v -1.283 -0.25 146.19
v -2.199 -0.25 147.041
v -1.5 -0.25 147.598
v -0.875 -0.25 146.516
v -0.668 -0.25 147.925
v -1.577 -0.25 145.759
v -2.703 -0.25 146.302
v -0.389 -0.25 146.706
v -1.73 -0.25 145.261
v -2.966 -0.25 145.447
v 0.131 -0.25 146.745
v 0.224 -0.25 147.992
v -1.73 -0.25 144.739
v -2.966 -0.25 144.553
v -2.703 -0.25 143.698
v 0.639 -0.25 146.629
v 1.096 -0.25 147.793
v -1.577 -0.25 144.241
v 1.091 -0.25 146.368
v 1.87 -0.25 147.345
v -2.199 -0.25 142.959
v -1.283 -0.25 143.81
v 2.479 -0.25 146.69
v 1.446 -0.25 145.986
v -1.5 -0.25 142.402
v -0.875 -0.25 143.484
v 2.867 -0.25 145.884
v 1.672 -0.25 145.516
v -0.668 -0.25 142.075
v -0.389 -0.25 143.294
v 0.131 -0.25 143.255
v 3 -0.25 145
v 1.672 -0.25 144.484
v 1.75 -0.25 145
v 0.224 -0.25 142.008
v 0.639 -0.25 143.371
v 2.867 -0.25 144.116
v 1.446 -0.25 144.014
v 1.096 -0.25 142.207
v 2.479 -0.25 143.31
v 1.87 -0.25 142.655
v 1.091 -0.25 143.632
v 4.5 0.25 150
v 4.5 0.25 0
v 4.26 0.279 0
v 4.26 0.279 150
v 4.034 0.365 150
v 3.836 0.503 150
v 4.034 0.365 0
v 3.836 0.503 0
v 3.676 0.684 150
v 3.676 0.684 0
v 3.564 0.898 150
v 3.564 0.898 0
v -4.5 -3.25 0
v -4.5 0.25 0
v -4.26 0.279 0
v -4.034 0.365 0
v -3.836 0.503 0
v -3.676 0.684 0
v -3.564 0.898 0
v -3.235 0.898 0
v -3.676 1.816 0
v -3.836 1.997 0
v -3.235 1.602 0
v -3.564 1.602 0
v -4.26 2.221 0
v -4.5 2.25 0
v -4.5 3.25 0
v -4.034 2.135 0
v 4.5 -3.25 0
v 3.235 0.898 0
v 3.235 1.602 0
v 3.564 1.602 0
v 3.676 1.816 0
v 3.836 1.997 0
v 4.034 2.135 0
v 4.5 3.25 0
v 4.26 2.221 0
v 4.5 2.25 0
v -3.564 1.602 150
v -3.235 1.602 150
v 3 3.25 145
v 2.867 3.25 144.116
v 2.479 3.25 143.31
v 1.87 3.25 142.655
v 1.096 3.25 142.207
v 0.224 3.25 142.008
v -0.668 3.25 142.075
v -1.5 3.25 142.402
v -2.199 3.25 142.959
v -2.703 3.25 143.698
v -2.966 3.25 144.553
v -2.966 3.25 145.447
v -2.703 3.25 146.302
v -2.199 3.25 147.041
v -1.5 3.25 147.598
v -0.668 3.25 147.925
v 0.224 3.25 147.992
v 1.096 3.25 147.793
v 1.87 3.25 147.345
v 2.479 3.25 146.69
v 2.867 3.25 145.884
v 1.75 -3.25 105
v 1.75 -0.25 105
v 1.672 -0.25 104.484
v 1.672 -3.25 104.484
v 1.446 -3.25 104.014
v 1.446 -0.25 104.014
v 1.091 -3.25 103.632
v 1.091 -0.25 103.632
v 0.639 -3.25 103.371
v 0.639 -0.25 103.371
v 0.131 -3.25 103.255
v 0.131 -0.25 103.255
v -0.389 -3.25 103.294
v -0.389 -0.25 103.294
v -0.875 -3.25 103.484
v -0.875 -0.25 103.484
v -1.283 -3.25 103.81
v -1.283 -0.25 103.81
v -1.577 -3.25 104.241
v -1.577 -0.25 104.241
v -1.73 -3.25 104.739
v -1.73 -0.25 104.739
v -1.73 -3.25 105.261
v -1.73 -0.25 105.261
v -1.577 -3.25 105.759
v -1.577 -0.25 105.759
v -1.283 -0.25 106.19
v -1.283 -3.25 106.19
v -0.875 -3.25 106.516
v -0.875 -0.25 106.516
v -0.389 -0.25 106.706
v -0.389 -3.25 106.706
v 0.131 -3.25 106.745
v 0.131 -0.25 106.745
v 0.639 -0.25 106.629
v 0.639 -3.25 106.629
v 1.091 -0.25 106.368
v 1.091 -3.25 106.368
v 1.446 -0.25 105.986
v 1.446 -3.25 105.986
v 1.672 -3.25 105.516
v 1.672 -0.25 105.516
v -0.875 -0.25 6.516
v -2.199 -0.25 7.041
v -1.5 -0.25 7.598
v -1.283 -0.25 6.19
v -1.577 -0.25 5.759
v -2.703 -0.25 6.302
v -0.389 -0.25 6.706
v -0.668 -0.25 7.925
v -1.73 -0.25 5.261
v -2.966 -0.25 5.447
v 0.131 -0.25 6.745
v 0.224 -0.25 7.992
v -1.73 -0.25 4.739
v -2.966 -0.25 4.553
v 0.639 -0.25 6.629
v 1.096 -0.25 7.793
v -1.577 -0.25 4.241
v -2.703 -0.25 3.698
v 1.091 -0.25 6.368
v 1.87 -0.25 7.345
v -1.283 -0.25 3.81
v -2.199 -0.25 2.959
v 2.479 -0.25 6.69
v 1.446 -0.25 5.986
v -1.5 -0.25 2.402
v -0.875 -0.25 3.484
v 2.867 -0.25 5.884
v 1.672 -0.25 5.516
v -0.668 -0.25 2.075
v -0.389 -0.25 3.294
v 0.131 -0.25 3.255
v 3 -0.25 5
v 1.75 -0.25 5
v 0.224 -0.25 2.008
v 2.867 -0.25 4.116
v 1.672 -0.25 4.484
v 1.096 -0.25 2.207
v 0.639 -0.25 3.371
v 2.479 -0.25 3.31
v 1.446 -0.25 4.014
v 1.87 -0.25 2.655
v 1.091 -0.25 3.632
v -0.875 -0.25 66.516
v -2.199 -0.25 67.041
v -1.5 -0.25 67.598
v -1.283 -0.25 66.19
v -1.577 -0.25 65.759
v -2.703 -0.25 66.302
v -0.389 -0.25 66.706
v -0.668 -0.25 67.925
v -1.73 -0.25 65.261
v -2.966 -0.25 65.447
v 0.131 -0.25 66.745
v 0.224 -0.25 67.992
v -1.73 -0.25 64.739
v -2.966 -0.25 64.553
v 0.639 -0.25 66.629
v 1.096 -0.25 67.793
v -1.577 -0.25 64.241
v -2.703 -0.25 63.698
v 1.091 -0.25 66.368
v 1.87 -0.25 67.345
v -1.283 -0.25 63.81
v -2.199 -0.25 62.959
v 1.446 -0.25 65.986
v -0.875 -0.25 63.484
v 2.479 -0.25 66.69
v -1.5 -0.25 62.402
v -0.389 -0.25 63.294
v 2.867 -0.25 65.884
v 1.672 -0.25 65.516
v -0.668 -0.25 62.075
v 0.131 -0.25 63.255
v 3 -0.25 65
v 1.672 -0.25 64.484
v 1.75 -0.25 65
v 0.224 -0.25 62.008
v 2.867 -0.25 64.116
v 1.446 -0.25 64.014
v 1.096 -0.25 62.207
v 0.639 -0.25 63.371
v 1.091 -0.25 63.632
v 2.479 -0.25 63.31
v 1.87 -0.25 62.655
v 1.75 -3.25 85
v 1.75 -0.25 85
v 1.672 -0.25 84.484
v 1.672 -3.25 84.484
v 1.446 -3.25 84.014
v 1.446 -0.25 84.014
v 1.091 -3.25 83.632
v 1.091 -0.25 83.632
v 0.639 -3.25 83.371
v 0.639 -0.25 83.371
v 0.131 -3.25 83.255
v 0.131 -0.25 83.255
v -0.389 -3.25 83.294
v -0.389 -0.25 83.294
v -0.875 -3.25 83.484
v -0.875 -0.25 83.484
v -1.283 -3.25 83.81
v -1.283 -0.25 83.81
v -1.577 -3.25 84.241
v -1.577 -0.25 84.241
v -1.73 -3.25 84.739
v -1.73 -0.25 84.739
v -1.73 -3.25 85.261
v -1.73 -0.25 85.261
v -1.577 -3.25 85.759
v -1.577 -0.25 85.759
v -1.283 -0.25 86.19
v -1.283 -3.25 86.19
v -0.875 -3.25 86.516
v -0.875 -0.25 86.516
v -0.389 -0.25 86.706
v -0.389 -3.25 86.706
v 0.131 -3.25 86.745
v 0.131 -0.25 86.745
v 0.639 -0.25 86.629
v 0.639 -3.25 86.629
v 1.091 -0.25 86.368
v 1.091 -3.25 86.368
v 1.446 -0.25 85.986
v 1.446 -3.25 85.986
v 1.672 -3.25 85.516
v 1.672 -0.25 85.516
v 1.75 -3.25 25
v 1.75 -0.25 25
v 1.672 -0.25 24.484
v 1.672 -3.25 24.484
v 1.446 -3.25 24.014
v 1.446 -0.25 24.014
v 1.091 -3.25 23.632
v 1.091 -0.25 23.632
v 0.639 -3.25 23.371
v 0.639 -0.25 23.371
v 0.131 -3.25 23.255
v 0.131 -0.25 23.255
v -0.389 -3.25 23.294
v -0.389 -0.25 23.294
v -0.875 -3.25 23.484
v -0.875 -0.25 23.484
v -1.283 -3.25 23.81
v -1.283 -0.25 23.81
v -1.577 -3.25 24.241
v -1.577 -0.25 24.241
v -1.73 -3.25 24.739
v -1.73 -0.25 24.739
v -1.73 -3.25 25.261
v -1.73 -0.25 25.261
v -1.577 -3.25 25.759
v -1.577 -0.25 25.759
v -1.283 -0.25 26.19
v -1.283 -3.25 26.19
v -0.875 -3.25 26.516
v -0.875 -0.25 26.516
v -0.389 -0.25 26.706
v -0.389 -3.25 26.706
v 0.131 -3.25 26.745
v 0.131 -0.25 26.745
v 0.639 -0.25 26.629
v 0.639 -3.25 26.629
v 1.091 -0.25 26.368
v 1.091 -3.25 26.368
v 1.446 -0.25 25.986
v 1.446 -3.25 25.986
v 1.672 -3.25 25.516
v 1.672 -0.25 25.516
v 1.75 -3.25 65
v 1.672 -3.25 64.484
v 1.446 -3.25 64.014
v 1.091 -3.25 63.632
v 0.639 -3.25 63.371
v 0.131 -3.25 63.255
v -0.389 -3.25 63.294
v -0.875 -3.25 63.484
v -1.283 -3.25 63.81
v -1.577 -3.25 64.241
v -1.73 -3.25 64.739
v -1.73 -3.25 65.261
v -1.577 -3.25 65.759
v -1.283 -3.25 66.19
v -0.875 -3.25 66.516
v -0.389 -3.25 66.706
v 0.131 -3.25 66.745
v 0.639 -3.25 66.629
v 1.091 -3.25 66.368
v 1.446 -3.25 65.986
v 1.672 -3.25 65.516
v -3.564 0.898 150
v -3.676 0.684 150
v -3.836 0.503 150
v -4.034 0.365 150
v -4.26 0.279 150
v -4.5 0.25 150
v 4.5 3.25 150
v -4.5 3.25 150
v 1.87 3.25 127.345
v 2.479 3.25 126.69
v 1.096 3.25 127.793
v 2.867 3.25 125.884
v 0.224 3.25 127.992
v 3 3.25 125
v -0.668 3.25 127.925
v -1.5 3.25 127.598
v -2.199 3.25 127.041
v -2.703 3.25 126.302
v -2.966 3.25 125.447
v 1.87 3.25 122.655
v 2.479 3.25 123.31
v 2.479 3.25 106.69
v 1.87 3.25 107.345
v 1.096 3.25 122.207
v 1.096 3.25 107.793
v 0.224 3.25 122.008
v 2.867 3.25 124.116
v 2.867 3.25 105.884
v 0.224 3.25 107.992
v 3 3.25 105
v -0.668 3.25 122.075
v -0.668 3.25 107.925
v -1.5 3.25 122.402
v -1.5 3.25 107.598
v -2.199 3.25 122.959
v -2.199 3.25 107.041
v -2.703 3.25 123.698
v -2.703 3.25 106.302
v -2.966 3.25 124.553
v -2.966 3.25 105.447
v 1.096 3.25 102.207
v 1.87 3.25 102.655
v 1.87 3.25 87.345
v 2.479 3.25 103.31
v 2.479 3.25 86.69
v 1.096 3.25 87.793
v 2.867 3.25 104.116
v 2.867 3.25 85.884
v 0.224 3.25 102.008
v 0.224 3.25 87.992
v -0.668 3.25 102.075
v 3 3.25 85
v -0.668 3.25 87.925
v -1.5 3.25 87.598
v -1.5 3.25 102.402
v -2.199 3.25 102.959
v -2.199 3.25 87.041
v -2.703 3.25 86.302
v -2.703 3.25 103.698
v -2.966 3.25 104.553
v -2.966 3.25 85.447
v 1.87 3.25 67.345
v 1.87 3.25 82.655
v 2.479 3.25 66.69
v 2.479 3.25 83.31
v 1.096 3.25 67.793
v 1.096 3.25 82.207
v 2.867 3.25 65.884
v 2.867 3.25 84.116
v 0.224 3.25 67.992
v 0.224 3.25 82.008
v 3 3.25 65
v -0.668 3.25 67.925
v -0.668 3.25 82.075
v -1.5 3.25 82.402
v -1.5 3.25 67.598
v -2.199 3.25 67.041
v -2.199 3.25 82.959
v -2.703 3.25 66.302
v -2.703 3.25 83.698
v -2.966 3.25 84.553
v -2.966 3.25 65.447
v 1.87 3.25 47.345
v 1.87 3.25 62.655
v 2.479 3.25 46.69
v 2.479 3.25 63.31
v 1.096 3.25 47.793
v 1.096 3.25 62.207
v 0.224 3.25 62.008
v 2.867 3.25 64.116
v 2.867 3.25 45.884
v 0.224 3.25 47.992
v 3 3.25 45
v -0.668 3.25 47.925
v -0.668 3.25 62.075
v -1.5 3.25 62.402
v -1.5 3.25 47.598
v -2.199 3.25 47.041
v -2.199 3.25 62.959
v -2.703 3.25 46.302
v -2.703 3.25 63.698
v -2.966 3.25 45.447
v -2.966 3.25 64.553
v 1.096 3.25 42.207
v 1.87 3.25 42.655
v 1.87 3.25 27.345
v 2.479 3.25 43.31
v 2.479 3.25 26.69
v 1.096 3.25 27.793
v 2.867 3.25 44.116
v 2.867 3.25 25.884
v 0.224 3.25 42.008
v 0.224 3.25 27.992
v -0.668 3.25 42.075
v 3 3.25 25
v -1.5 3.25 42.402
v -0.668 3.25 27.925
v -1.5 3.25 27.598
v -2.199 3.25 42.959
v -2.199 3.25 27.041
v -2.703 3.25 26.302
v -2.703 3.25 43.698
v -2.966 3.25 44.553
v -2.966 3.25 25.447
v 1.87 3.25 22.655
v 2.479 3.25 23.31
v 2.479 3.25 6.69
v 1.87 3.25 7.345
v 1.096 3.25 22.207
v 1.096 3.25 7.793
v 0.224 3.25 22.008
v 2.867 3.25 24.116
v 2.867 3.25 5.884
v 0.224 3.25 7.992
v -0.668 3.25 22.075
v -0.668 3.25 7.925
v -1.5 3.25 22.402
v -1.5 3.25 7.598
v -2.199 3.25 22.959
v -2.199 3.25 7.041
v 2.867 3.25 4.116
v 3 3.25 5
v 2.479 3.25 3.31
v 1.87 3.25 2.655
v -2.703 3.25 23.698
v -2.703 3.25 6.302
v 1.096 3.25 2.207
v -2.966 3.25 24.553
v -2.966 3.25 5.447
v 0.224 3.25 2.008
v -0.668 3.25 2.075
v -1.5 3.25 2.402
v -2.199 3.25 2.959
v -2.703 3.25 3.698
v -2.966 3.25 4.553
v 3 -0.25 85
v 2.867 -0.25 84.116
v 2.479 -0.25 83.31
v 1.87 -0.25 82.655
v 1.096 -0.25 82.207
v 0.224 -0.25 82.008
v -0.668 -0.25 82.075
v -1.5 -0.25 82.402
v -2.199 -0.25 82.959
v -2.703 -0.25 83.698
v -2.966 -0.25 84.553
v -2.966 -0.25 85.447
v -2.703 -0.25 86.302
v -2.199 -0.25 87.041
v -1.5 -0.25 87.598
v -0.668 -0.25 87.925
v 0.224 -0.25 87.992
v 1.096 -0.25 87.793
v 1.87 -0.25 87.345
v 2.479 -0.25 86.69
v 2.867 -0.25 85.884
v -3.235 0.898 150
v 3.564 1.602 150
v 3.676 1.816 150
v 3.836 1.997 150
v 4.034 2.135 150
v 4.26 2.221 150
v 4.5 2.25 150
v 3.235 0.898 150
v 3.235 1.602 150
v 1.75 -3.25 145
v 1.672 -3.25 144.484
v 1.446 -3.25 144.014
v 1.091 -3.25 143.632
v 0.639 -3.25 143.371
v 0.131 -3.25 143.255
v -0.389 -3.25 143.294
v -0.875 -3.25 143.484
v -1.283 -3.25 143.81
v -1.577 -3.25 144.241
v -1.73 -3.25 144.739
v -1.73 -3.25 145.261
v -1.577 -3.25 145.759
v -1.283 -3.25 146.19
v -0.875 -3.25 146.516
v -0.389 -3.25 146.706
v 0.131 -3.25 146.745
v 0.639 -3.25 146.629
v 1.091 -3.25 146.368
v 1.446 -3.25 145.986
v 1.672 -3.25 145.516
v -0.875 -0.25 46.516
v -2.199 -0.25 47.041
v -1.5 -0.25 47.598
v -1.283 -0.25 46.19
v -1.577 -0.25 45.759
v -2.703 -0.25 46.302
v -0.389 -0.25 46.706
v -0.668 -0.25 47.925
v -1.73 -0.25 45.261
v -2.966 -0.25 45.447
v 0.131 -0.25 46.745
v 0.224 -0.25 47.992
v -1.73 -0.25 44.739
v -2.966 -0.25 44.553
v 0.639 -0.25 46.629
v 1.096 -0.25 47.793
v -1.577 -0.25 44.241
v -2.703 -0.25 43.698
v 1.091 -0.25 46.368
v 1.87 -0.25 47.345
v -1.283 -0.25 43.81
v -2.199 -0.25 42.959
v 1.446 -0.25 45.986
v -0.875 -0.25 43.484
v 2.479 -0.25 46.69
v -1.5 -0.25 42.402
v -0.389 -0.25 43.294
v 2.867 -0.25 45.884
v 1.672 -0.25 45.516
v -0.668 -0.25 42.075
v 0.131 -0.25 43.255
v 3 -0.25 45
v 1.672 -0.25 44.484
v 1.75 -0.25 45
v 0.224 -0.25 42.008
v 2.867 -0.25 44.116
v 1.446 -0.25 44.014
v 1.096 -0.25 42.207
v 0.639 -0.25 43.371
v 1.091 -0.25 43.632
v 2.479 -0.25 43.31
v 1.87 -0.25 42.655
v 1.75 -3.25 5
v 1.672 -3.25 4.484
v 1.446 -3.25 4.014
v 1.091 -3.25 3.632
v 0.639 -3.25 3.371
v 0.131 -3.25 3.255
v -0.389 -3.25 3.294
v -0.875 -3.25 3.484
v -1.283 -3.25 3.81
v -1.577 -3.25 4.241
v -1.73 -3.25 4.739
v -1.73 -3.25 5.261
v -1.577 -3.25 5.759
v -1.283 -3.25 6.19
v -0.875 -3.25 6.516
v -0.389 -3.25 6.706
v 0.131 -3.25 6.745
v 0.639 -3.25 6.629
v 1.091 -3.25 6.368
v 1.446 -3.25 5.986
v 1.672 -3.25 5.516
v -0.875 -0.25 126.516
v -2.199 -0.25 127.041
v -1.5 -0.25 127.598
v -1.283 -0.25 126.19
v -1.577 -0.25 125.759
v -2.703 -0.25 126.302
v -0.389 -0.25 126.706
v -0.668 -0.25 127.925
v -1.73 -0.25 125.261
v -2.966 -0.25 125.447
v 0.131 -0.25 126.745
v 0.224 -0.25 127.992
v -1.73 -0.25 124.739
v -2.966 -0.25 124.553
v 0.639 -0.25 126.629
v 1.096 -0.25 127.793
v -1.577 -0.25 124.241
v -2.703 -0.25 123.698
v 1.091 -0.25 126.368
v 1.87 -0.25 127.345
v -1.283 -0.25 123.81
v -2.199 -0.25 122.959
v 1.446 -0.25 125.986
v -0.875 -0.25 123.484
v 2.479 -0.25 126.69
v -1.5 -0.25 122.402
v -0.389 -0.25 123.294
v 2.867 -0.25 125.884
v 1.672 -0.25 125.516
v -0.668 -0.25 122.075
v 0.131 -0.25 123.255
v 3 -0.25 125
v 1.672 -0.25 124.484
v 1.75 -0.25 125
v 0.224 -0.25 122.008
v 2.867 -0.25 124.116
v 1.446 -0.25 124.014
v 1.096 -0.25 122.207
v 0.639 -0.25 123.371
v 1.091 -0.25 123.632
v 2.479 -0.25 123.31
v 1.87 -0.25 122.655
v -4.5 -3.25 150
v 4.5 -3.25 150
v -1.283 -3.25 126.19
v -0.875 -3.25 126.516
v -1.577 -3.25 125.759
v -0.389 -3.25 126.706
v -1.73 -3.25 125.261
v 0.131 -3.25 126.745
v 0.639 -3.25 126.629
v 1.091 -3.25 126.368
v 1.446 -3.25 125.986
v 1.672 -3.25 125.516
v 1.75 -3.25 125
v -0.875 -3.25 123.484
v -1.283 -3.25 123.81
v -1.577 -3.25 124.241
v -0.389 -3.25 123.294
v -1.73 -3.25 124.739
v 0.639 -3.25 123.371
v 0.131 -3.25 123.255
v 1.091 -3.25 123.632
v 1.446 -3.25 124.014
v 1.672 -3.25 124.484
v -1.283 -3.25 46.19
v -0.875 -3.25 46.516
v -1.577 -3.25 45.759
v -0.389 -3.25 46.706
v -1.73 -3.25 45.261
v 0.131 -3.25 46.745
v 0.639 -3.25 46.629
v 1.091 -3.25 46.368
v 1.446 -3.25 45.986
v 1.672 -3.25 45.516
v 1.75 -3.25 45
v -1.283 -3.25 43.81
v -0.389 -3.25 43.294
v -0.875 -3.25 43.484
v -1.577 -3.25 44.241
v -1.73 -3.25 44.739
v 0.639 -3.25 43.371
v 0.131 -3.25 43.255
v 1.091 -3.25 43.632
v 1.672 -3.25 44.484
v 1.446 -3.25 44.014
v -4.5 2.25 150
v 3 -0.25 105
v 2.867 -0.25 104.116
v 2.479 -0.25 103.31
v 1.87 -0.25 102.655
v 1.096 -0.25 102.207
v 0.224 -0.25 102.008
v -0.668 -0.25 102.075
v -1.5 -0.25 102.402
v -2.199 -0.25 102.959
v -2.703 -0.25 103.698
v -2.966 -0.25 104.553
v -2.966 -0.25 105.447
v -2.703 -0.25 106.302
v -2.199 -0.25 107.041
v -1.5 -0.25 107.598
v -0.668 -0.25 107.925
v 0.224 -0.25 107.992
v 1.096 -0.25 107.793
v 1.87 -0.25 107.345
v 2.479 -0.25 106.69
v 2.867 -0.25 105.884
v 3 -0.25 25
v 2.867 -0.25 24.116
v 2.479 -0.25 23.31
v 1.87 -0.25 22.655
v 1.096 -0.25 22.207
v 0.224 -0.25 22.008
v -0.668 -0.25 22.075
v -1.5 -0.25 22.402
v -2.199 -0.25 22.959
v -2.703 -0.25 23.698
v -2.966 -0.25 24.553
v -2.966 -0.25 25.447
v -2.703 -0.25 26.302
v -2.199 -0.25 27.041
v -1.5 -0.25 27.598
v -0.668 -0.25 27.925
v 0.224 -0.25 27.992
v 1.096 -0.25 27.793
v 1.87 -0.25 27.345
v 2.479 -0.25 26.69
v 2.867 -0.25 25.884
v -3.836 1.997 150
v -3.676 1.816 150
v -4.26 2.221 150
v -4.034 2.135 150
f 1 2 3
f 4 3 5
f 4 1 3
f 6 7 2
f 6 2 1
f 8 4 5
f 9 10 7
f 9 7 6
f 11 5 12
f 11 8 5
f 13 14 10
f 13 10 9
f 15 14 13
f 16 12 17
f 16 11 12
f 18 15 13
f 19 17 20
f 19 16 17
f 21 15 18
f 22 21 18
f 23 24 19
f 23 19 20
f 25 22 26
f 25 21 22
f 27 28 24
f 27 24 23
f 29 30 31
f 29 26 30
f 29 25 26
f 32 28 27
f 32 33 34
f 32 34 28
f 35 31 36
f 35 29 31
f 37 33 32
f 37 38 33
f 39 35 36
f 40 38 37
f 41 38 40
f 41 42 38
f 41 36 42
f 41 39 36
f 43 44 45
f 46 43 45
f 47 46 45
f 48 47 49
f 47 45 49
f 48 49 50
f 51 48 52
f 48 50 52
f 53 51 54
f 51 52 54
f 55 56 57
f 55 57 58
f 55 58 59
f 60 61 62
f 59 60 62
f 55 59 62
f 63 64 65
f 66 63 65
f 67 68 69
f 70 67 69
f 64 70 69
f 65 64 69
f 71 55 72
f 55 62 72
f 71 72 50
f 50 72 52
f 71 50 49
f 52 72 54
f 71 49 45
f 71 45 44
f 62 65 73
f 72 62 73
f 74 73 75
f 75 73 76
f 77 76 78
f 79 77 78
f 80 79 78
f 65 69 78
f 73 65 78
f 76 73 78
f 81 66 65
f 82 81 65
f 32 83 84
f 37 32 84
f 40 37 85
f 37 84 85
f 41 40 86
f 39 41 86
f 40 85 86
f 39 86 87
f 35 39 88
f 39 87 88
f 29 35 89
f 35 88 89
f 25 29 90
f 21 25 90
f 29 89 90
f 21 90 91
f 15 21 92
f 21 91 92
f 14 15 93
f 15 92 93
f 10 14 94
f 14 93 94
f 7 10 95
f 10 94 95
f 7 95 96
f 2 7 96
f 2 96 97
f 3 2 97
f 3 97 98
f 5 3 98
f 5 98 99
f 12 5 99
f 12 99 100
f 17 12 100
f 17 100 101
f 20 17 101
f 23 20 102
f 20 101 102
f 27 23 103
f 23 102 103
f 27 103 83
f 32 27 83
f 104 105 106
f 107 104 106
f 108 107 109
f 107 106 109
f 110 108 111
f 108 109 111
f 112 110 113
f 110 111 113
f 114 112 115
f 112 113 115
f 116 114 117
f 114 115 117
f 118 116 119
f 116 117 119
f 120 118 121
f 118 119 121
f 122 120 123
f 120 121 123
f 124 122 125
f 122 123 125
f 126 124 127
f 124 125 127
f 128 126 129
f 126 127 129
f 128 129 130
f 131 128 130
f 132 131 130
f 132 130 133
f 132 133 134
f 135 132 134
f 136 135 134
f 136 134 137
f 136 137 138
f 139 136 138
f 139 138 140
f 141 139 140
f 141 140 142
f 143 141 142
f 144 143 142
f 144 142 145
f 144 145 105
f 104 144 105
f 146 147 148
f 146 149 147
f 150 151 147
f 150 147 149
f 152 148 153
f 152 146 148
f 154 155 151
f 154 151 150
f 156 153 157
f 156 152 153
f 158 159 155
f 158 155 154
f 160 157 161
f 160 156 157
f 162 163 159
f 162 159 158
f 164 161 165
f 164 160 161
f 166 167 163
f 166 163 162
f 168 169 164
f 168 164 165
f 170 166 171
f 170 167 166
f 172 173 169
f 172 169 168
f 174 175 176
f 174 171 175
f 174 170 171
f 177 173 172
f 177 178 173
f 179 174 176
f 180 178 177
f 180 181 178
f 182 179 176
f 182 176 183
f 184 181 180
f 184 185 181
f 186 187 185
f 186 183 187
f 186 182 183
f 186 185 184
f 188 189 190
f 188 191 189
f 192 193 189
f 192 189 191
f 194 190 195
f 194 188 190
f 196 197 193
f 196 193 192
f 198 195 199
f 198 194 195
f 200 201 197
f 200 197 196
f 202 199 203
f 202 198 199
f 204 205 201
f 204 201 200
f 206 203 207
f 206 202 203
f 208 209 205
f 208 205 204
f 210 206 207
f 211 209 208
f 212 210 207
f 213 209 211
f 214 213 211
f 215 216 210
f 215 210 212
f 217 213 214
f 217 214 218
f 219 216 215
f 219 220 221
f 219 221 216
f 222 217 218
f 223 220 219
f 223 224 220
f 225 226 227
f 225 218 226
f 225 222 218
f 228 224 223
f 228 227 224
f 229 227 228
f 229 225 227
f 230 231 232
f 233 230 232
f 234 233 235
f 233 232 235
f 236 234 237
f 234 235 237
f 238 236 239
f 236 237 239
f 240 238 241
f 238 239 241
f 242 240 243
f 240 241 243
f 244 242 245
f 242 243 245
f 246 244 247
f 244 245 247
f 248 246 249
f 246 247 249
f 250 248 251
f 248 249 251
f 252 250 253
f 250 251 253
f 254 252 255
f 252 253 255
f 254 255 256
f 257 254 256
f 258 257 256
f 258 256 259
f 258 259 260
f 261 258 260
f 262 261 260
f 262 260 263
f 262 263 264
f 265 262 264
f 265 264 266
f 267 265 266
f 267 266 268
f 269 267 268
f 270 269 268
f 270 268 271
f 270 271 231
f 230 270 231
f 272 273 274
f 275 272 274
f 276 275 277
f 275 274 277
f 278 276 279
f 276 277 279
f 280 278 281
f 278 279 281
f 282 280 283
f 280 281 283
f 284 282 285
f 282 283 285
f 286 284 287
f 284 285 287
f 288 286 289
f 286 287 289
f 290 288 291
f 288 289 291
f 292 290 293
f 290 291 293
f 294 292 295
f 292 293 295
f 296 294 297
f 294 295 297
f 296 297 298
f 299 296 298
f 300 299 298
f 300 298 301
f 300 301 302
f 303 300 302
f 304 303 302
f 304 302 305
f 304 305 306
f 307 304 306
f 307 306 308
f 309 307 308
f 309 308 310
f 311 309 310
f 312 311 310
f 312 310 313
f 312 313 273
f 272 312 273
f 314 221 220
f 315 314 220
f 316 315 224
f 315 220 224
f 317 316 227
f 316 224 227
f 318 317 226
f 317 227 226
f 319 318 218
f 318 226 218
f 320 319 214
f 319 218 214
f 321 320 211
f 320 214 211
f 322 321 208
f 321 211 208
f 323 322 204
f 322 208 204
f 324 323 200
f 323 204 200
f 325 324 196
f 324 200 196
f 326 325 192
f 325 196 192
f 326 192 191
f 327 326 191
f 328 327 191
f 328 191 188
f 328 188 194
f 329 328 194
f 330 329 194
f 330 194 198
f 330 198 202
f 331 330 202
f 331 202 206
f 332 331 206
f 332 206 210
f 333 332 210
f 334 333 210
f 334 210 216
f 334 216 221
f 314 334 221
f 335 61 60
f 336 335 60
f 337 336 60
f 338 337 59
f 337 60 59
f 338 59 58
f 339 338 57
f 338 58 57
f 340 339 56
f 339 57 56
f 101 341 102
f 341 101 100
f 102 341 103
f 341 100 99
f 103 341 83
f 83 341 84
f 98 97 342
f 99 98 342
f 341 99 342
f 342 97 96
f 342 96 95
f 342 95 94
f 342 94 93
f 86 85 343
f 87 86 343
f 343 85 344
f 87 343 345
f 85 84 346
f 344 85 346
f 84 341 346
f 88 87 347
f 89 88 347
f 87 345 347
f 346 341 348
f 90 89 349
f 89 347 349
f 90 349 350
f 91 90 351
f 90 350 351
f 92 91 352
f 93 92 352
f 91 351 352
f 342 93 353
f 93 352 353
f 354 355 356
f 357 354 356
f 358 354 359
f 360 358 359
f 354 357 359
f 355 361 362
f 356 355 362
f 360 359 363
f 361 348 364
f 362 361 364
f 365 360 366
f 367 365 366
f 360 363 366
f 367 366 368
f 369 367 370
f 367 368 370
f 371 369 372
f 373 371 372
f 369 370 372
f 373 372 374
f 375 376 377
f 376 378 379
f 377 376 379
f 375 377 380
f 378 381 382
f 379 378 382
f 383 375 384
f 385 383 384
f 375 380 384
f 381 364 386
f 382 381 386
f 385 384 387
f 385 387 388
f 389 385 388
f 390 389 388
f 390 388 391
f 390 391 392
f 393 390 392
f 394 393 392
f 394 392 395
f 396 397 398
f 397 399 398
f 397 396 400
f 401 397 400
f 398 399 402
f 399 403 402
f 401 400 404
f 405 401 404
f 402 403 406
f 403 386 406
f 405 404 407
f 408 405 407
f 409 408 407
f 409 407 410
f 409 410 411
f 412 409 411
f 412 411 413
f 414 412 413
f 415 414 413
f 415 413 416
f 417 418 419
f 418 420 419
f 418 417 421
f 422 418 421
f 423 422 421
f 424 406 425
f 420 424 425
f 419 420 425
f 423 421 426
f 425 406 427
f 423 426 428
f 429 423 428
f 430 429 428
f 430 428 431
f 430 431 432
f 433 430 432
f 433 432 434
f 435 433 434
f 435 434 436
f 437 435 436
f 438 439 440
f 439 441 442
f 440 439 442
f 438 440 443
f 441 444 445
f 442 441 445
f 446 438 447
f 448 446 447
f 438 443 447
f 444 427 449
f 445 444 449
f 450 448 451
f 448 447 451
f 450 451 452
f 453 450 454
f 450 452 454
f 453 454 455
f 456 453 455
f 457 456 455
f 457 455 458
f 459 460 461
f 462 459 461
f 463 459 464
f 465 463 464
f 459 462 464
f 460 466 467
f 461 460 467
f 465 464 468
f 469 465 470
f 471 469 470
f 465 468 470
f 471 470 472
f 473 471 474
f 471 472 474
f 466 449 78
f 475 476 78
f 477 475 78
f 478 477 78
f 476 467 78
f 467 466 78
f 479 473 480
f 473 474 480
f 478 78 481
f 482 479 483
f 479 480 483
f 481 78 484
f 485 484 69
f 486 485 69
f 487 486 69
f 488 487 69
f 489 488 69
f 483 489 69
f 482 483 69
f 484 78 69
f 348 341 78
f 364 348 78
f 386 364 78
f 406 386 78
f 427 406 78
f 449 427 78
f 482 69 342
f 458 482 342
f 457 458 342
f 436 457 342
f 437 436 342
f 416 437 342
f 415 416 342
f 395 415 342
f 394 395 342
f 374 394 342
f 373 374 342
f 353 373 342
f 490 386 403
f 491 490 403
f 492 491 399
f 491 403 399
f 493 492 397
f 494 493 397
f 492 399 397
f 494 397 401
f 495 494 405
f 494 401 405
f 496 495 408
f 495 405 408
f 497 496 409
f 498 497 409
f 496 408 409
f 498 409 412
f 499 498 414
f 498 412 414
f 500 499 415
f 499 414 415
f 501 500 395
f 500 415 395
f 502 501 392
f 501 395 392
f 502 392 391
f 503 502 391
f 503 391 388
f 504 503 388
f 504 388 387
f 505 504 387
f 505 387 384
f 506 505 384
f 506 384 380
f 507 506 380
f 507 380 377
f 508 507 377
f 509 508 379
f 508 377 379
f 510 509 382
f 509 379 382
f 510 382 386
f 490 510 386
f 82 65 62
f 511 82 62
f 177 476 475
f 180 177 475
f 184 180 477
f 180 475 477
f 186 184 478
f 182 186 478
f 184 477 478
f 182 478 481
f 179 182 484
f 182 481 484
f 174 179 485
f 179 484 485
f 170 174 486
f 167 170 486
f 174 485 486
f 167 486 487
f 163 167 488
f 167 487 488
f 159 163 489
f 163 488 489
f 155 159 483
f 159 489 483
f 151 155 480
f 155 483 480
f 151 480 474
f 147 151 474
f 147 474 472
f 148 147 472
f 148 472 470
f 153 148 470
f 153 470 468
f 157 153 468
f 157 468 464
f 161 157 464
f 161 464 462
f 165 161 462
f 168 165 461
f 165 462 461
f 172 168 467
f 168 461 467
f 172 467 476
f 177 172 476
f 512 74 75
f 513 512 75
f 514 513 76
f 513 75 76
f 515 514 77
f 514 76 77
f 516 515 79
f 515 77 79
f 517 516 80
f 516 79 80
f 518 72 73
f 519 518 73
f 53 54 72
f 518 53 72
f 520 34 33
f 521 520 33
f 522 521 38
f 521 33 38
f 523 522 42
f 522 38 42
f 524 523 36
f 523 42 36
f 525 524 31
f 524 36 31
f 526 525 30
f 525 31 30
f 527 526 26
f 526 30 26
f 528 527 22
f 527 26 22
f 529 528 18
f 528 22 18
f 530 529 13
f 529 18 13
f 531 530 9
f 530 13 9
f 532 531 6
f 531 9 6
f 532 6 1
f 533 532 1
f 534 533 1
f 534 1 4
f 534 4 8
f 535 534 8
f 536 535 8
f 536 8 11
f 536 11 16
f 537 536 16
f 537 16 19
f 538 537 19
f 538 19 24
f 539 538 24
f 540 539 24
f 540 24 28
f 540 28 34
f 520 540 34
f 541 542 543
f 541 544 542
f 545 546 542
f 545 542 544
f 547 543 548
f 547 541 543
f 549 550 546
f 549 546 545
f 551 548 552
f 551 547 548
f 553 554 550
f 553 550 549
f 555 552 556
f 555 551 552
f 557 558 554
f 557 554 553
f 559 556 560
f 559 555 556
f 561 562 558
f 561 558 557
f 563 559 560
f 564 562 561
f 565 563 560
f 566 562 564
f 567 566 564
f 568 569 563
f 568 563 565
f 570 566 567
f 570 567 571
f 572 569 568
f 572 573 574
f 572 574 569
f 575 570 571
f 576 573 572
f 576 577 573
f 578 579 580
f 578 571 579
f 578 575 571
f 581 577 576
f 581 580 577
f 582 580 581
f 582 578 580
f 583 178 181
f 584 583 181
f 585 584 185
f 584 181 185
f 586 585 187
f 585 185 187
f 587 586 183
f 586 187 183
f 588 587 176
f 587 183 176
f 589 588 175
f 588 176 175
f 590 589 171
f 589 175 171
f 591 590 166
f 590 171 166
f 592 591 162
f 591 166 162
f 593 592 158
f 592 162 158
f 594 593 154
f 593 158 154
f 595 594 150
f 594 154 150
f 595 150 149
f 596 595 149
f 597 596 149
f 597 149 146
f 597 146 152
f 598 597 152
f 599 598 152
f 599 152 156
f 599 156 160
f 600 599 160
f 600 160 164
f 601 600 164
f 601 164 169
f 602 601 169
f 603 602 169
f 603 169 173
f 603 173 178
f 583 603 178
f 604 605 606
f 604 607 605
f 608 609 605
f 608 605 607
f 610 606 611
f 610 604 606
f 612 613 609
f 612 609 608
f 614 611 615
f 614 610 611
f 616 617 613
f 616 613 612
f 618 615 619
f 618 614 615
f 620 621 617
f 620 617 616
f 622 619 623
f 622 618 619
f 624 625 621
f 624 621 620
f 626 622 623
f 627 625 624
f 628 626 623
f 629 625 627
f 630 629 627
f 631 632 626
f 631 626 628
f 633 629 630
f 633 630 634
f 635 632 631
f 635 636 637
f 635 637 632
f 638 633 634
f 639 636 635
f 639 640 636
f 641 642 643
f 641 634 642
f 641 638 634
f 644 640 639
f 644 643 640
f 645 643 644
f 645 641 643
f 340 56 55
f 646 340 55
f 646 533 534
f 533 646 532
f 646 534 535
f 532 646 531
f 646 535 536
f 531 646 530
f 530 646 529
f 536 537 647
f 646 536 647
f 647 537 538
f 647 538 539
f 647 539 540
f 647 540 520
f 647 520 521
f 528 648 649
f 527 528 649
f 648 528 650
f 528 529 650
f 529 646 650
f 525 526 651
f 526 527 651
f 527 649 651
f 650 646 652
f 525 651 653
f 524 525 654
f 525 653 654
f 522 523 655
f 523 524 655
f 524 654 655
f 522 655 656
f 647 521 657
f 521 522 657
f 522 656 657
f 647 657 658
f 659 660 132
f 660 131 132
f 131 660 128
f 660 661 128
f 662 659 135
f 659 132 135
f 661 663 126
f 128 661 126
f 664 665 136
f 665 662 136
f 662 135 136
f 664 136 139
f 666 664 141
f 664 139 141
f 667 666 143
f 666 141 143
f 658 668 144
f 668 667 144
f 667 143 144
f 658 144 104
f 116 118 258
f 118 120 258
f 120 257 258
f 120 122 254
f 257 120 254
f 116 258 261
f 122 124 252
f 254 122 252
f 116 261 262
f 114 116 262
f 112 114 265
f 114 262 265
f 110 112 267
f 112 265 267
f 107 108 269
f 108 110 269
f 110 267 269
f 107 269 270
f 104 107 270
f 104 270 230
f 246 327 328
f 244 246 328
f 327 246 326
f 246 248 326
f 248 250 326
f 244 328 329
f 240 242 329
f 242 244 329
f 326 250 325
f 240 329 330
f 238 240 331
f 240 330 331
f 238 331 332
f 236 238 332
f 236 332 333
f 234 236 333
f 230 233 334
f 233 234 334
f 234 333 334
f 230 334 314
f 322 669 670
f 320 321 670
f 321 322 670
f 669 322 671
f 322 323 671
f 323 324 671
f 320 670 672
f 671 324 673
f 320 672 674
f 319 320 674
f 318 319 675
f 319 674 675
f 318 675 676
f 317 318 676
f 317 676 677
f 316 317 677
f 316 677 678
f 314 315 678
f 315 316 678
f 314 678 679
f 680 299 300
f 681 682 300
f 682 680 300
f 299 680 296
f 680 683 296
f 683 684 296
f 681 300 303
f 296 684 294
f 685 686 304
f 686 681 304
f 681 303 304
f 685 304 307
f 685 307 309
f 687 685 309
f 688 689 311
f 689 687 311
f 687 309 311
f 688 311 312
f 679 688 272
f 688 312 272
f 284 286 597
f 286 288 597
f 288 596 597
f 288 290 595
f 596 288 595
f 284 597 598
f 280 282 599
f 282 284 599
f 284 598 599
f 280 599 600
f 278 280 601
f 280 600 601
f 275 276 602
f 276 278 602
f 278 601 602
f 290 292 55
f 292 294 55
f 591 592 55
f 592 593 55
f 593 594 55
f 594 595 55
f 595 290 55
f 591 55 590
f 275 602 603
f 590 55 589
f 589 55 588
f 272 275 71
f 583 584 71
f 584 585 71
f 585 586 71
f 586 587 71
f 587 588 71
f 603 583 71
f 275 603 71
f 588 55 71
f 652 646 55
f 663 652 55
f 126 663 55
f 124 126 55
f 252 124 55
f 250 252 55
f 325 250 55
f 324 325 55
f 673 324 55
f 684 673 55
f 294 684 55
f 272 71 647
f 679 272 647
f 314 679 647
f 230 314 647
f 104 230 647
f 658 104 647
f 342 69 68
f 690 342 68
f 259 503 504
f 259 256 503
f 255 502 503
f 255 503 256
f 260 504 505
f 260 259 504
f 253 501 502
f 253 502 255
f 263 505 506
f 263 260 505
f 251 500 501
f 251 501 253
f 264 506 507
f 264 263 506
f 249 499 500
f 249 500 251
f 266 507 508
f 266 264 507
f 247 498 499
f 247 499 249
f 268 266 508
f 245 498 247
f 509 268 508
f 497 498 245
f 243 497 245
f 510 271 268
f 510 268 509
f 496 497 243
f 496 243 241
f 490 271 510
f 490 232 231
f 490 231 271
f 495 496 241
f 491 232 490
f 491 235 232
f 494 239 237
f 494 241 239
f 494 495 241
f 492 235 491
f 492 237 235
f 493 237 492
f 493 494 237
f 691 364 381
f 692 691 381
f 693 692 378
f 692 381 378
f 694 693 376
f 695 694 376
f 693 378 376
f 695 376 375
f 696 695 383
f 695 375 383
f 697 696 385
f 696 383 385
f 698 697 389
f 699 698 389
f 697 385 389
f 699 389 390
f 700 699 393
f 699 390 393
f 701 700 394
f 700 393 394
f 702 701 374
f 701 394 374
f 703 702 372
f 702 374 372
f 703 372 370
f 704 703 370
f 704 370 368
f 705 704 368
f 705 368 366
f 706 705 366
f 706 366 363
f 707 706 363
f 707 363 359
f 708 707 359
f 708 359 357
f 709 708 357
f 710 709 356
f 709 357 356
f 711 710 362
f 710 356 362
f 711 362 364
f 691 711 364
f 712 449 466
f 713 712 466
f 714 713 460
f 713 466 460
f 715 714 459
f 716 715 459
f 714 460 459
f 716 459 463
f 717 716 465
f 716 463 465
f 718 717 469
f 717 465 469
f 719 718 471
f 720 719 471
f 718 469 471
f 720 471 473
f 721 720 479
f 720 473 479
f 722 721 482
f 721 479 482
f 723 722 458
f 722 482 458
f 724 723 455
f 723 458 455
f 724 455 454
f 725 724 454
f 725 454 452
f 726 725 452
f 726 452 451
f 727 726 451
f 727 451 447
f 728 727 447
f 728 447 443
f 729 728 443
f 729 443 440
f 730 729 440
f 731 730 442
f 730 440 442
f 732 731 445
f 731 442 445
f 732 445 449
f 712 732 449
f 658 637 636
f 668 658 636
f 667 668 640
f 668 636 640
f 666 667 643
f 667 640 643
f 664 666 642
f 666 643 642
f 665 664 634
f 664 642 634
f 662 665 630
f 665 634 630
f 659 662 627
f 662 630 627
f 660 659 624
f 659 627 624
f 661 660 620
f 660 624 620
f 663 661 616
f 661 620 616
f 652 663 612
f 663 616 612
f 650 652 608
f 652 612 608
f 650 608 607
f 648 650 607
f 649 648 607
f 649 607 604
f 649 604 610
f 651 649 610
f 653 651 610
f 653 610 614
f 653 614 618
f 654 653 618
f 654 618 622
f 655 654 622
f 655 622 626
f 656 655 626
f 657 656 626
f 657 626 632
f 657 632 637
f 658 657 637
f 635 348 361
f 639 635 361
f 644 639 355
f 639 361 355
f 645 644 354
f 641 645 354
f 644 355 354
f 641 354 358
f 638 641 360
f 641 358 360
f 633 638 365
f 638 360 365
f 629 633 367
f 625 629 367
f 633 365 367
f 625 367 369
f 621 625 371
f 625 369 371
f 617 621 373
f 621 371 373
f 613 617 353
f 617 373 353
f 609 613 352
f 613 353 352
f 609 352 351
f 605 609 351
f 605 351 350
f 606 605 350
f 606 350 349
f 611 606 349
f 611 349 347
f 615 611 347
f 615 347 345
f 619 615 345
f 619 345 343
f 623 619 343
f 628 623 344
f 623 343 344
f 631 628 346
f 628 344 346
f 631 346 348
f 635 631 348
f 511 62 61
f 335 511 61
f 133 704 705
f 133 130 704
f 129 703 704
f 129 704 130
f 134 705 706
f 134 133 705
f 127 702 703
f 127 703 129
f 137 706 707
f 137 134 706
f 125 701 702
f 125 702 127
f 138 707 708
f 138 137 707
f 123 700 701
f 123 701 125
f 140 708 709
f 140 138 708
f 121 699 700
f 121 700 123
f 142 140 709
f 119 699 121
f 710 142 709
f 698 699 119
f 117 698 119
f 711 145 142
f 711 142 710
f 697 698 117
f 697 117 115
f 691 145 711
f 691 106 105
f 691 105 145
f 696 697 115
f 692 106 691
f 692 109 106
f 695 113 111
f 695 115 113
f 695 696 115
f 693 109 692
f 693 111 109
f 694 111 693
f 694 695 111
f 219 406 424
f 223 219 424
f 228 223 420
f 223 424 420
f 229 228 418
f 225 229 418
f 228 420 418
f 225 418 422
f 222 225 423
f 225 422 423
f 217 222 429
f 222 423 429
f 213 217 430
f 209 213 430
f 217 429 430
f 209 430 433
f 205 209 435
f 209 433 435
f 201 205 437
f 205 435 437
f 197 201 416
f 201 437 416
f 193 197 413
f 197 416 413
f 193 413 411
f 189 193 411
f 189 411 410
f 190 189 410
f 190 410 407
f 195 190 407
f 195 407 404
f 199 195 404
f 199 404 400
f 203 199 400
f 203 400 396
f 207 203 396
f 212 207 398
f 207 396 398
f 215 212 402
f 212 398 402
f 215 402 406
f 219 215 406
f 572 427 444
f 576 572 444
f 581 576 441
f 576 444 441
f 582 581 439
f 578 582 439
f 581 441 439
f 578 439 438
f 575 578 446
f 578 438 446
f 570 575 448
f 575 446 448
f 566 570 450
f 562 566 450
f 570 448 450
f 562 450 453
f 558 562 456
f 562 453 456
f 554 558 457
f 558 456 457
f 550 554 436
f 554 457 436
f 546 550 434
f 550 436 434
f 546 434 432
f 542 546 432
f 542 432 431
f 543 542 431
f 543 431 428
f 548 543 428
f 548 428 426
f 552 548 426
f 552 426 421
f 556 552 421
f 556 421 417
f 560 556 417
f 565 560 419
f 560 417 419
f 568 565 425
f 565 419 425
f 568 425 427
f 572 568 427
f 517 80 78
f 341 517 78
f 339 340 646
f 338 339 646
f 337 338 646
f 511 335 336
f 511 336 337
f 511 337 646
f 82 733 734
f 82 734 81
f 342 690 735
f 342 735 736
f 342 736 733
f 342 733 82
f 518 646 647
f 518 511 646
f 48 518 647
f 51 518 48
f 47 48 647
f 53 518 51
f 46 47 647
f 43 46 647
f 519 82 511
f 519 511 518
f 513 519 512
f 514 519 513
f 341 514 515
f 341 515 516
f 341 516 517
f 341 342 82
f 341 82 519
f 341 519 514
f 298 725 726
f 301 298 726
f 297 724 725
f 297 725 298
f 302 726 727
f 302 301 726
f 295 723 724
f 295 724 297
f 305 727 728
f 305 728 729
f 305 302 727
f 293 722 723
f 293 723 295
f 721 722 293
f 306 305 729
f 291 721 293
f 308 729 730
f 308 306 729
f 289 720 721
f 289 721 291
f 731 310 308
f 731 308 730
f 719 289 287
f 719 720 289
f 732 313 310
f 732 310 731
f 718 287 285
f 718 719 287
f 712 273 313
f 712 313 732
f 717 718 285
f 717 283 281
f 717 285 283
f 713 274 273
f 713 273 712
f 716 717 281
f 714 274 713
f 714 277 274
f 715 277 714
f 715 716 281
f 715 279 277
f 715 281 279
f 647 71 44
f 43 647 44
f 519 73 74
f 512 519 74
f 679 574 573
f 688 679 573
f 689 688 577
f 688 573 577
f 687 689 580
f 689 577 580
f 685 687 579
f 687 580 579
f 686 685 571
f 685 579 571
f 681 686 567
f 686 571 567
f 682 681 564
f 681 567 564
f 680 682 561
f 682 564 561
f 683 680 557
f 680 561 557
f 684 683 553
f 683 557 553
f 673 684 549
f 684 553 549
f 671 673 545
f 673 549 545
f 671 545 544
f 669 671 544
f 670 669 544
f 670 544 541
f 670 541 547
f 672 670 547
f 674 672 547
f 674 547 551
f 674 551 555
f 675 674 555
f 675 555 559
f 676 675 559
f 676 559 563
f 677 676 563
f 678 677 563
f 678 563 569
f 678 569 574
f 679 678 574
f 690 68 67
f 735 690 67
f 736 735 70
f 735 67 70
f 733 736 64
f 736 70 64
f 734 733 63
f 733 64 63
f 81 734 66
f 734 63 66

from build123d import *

# Parameters (mm, degrees)
EXTRUDE1_DEPTH  = 150
SKETCH2_R       = 3
EXTRUDE2_DEPTH  = 3.5
SKETCH_R        = 1.75
EXTRUDE3_DEPTH  = 7.5
LPATTERN1_COUNT = 13
LPATTERN1_PITCH = 20


with BuildPart() as part:
    # Sketch1 → Extrude1 (new body)
    with BuildSketch(Plane.XY):
        with BuildLine():
            Line((-4.5, -3.25), (4.5, -3.25))
            Line((4.5, -3.25), (4.5, 0.25))
            ThreePointArc((4.5, 0.25), (3.93077967, 0.427814974), (3.563991137, 0.898023568))
            Line((3.563991137, 0.898023568), (3.235073025, 0.898023568))
            Line((3.235073025, 0.898023568), (3.235073025, 1.601976432))
            Line((3.235073025, 1.601976432), (3.563991137, 1.601976432))
            ThreePointArc((3.563991137, 1.601976432), (3.93077967, 2.072185026), (4.5, 2.25))
            Line((4.5, 2.25), (4.5, 3.25))
            Line((4.5, 3.25), (-4.5, 3.25))
            Line((-4.5, 3.25), (-4.5, 2.25))
            ThreePointArc((-4.5, 2.25), (-3.93077967, 2.072185026), (-3.563991137, 1.601976432))
            Line((-3.563991137, 1.601976432), (-3.235073025, 1.601976432))
            Line((-3.235073025, 1.601976432), (-3.235073025, 0.898023568))
            Line((-3.235073025, 0.898023568), (-3.563991137, 0.898023568))
            ThreePointArc((-3.563991137, 0.898023568), (-3.93077967, 0.427814974), (-4.5, 0.25))
            Line((-4.5, 0.25), (-4.5, -3.25))
        make_face()
    extrude(amount=EXTRUDE1_DEPTH)

    # Sketch2 → Extrude2 (cut)
    with BuildSketch(Plane(origin=(0, 3.25, 0), x_dir=(1, 0, 0), z_dir=(0, 1, 0))):
        with Locations((0, -5)):
            Circle(SKETCH2_R)
    extrude2 = extrude(amount=-EXTRUDE2_DEPTH, mode=Mode.SUBTRACT)

    # Sketch → Extrude3 (cut, through all)
    with BuildSketch(Plane(origin=(0, 3.25, 0), x_dir=(1, 0, 0), z_dir=(0, 1, 0))):
        with Locations((0, -5)):
            Circle(SKETCH_R)
    extrude3 = extrude(amount=-EXTRUDE3_DEPTH, mode=Mode.SUBTRACT)

    # LPattern1: Extrude2, Extrude3 ×13
    with Locations(*[(0, 0, i * LPATTERN1_PITCH) for i in range(1, LPATTERN1_COUNT)]):
        add(extrude2, mode=Mode.SUBTRACT)
        add(extrude3, mode=Mode.SUBTRACT)


solid = part.part
